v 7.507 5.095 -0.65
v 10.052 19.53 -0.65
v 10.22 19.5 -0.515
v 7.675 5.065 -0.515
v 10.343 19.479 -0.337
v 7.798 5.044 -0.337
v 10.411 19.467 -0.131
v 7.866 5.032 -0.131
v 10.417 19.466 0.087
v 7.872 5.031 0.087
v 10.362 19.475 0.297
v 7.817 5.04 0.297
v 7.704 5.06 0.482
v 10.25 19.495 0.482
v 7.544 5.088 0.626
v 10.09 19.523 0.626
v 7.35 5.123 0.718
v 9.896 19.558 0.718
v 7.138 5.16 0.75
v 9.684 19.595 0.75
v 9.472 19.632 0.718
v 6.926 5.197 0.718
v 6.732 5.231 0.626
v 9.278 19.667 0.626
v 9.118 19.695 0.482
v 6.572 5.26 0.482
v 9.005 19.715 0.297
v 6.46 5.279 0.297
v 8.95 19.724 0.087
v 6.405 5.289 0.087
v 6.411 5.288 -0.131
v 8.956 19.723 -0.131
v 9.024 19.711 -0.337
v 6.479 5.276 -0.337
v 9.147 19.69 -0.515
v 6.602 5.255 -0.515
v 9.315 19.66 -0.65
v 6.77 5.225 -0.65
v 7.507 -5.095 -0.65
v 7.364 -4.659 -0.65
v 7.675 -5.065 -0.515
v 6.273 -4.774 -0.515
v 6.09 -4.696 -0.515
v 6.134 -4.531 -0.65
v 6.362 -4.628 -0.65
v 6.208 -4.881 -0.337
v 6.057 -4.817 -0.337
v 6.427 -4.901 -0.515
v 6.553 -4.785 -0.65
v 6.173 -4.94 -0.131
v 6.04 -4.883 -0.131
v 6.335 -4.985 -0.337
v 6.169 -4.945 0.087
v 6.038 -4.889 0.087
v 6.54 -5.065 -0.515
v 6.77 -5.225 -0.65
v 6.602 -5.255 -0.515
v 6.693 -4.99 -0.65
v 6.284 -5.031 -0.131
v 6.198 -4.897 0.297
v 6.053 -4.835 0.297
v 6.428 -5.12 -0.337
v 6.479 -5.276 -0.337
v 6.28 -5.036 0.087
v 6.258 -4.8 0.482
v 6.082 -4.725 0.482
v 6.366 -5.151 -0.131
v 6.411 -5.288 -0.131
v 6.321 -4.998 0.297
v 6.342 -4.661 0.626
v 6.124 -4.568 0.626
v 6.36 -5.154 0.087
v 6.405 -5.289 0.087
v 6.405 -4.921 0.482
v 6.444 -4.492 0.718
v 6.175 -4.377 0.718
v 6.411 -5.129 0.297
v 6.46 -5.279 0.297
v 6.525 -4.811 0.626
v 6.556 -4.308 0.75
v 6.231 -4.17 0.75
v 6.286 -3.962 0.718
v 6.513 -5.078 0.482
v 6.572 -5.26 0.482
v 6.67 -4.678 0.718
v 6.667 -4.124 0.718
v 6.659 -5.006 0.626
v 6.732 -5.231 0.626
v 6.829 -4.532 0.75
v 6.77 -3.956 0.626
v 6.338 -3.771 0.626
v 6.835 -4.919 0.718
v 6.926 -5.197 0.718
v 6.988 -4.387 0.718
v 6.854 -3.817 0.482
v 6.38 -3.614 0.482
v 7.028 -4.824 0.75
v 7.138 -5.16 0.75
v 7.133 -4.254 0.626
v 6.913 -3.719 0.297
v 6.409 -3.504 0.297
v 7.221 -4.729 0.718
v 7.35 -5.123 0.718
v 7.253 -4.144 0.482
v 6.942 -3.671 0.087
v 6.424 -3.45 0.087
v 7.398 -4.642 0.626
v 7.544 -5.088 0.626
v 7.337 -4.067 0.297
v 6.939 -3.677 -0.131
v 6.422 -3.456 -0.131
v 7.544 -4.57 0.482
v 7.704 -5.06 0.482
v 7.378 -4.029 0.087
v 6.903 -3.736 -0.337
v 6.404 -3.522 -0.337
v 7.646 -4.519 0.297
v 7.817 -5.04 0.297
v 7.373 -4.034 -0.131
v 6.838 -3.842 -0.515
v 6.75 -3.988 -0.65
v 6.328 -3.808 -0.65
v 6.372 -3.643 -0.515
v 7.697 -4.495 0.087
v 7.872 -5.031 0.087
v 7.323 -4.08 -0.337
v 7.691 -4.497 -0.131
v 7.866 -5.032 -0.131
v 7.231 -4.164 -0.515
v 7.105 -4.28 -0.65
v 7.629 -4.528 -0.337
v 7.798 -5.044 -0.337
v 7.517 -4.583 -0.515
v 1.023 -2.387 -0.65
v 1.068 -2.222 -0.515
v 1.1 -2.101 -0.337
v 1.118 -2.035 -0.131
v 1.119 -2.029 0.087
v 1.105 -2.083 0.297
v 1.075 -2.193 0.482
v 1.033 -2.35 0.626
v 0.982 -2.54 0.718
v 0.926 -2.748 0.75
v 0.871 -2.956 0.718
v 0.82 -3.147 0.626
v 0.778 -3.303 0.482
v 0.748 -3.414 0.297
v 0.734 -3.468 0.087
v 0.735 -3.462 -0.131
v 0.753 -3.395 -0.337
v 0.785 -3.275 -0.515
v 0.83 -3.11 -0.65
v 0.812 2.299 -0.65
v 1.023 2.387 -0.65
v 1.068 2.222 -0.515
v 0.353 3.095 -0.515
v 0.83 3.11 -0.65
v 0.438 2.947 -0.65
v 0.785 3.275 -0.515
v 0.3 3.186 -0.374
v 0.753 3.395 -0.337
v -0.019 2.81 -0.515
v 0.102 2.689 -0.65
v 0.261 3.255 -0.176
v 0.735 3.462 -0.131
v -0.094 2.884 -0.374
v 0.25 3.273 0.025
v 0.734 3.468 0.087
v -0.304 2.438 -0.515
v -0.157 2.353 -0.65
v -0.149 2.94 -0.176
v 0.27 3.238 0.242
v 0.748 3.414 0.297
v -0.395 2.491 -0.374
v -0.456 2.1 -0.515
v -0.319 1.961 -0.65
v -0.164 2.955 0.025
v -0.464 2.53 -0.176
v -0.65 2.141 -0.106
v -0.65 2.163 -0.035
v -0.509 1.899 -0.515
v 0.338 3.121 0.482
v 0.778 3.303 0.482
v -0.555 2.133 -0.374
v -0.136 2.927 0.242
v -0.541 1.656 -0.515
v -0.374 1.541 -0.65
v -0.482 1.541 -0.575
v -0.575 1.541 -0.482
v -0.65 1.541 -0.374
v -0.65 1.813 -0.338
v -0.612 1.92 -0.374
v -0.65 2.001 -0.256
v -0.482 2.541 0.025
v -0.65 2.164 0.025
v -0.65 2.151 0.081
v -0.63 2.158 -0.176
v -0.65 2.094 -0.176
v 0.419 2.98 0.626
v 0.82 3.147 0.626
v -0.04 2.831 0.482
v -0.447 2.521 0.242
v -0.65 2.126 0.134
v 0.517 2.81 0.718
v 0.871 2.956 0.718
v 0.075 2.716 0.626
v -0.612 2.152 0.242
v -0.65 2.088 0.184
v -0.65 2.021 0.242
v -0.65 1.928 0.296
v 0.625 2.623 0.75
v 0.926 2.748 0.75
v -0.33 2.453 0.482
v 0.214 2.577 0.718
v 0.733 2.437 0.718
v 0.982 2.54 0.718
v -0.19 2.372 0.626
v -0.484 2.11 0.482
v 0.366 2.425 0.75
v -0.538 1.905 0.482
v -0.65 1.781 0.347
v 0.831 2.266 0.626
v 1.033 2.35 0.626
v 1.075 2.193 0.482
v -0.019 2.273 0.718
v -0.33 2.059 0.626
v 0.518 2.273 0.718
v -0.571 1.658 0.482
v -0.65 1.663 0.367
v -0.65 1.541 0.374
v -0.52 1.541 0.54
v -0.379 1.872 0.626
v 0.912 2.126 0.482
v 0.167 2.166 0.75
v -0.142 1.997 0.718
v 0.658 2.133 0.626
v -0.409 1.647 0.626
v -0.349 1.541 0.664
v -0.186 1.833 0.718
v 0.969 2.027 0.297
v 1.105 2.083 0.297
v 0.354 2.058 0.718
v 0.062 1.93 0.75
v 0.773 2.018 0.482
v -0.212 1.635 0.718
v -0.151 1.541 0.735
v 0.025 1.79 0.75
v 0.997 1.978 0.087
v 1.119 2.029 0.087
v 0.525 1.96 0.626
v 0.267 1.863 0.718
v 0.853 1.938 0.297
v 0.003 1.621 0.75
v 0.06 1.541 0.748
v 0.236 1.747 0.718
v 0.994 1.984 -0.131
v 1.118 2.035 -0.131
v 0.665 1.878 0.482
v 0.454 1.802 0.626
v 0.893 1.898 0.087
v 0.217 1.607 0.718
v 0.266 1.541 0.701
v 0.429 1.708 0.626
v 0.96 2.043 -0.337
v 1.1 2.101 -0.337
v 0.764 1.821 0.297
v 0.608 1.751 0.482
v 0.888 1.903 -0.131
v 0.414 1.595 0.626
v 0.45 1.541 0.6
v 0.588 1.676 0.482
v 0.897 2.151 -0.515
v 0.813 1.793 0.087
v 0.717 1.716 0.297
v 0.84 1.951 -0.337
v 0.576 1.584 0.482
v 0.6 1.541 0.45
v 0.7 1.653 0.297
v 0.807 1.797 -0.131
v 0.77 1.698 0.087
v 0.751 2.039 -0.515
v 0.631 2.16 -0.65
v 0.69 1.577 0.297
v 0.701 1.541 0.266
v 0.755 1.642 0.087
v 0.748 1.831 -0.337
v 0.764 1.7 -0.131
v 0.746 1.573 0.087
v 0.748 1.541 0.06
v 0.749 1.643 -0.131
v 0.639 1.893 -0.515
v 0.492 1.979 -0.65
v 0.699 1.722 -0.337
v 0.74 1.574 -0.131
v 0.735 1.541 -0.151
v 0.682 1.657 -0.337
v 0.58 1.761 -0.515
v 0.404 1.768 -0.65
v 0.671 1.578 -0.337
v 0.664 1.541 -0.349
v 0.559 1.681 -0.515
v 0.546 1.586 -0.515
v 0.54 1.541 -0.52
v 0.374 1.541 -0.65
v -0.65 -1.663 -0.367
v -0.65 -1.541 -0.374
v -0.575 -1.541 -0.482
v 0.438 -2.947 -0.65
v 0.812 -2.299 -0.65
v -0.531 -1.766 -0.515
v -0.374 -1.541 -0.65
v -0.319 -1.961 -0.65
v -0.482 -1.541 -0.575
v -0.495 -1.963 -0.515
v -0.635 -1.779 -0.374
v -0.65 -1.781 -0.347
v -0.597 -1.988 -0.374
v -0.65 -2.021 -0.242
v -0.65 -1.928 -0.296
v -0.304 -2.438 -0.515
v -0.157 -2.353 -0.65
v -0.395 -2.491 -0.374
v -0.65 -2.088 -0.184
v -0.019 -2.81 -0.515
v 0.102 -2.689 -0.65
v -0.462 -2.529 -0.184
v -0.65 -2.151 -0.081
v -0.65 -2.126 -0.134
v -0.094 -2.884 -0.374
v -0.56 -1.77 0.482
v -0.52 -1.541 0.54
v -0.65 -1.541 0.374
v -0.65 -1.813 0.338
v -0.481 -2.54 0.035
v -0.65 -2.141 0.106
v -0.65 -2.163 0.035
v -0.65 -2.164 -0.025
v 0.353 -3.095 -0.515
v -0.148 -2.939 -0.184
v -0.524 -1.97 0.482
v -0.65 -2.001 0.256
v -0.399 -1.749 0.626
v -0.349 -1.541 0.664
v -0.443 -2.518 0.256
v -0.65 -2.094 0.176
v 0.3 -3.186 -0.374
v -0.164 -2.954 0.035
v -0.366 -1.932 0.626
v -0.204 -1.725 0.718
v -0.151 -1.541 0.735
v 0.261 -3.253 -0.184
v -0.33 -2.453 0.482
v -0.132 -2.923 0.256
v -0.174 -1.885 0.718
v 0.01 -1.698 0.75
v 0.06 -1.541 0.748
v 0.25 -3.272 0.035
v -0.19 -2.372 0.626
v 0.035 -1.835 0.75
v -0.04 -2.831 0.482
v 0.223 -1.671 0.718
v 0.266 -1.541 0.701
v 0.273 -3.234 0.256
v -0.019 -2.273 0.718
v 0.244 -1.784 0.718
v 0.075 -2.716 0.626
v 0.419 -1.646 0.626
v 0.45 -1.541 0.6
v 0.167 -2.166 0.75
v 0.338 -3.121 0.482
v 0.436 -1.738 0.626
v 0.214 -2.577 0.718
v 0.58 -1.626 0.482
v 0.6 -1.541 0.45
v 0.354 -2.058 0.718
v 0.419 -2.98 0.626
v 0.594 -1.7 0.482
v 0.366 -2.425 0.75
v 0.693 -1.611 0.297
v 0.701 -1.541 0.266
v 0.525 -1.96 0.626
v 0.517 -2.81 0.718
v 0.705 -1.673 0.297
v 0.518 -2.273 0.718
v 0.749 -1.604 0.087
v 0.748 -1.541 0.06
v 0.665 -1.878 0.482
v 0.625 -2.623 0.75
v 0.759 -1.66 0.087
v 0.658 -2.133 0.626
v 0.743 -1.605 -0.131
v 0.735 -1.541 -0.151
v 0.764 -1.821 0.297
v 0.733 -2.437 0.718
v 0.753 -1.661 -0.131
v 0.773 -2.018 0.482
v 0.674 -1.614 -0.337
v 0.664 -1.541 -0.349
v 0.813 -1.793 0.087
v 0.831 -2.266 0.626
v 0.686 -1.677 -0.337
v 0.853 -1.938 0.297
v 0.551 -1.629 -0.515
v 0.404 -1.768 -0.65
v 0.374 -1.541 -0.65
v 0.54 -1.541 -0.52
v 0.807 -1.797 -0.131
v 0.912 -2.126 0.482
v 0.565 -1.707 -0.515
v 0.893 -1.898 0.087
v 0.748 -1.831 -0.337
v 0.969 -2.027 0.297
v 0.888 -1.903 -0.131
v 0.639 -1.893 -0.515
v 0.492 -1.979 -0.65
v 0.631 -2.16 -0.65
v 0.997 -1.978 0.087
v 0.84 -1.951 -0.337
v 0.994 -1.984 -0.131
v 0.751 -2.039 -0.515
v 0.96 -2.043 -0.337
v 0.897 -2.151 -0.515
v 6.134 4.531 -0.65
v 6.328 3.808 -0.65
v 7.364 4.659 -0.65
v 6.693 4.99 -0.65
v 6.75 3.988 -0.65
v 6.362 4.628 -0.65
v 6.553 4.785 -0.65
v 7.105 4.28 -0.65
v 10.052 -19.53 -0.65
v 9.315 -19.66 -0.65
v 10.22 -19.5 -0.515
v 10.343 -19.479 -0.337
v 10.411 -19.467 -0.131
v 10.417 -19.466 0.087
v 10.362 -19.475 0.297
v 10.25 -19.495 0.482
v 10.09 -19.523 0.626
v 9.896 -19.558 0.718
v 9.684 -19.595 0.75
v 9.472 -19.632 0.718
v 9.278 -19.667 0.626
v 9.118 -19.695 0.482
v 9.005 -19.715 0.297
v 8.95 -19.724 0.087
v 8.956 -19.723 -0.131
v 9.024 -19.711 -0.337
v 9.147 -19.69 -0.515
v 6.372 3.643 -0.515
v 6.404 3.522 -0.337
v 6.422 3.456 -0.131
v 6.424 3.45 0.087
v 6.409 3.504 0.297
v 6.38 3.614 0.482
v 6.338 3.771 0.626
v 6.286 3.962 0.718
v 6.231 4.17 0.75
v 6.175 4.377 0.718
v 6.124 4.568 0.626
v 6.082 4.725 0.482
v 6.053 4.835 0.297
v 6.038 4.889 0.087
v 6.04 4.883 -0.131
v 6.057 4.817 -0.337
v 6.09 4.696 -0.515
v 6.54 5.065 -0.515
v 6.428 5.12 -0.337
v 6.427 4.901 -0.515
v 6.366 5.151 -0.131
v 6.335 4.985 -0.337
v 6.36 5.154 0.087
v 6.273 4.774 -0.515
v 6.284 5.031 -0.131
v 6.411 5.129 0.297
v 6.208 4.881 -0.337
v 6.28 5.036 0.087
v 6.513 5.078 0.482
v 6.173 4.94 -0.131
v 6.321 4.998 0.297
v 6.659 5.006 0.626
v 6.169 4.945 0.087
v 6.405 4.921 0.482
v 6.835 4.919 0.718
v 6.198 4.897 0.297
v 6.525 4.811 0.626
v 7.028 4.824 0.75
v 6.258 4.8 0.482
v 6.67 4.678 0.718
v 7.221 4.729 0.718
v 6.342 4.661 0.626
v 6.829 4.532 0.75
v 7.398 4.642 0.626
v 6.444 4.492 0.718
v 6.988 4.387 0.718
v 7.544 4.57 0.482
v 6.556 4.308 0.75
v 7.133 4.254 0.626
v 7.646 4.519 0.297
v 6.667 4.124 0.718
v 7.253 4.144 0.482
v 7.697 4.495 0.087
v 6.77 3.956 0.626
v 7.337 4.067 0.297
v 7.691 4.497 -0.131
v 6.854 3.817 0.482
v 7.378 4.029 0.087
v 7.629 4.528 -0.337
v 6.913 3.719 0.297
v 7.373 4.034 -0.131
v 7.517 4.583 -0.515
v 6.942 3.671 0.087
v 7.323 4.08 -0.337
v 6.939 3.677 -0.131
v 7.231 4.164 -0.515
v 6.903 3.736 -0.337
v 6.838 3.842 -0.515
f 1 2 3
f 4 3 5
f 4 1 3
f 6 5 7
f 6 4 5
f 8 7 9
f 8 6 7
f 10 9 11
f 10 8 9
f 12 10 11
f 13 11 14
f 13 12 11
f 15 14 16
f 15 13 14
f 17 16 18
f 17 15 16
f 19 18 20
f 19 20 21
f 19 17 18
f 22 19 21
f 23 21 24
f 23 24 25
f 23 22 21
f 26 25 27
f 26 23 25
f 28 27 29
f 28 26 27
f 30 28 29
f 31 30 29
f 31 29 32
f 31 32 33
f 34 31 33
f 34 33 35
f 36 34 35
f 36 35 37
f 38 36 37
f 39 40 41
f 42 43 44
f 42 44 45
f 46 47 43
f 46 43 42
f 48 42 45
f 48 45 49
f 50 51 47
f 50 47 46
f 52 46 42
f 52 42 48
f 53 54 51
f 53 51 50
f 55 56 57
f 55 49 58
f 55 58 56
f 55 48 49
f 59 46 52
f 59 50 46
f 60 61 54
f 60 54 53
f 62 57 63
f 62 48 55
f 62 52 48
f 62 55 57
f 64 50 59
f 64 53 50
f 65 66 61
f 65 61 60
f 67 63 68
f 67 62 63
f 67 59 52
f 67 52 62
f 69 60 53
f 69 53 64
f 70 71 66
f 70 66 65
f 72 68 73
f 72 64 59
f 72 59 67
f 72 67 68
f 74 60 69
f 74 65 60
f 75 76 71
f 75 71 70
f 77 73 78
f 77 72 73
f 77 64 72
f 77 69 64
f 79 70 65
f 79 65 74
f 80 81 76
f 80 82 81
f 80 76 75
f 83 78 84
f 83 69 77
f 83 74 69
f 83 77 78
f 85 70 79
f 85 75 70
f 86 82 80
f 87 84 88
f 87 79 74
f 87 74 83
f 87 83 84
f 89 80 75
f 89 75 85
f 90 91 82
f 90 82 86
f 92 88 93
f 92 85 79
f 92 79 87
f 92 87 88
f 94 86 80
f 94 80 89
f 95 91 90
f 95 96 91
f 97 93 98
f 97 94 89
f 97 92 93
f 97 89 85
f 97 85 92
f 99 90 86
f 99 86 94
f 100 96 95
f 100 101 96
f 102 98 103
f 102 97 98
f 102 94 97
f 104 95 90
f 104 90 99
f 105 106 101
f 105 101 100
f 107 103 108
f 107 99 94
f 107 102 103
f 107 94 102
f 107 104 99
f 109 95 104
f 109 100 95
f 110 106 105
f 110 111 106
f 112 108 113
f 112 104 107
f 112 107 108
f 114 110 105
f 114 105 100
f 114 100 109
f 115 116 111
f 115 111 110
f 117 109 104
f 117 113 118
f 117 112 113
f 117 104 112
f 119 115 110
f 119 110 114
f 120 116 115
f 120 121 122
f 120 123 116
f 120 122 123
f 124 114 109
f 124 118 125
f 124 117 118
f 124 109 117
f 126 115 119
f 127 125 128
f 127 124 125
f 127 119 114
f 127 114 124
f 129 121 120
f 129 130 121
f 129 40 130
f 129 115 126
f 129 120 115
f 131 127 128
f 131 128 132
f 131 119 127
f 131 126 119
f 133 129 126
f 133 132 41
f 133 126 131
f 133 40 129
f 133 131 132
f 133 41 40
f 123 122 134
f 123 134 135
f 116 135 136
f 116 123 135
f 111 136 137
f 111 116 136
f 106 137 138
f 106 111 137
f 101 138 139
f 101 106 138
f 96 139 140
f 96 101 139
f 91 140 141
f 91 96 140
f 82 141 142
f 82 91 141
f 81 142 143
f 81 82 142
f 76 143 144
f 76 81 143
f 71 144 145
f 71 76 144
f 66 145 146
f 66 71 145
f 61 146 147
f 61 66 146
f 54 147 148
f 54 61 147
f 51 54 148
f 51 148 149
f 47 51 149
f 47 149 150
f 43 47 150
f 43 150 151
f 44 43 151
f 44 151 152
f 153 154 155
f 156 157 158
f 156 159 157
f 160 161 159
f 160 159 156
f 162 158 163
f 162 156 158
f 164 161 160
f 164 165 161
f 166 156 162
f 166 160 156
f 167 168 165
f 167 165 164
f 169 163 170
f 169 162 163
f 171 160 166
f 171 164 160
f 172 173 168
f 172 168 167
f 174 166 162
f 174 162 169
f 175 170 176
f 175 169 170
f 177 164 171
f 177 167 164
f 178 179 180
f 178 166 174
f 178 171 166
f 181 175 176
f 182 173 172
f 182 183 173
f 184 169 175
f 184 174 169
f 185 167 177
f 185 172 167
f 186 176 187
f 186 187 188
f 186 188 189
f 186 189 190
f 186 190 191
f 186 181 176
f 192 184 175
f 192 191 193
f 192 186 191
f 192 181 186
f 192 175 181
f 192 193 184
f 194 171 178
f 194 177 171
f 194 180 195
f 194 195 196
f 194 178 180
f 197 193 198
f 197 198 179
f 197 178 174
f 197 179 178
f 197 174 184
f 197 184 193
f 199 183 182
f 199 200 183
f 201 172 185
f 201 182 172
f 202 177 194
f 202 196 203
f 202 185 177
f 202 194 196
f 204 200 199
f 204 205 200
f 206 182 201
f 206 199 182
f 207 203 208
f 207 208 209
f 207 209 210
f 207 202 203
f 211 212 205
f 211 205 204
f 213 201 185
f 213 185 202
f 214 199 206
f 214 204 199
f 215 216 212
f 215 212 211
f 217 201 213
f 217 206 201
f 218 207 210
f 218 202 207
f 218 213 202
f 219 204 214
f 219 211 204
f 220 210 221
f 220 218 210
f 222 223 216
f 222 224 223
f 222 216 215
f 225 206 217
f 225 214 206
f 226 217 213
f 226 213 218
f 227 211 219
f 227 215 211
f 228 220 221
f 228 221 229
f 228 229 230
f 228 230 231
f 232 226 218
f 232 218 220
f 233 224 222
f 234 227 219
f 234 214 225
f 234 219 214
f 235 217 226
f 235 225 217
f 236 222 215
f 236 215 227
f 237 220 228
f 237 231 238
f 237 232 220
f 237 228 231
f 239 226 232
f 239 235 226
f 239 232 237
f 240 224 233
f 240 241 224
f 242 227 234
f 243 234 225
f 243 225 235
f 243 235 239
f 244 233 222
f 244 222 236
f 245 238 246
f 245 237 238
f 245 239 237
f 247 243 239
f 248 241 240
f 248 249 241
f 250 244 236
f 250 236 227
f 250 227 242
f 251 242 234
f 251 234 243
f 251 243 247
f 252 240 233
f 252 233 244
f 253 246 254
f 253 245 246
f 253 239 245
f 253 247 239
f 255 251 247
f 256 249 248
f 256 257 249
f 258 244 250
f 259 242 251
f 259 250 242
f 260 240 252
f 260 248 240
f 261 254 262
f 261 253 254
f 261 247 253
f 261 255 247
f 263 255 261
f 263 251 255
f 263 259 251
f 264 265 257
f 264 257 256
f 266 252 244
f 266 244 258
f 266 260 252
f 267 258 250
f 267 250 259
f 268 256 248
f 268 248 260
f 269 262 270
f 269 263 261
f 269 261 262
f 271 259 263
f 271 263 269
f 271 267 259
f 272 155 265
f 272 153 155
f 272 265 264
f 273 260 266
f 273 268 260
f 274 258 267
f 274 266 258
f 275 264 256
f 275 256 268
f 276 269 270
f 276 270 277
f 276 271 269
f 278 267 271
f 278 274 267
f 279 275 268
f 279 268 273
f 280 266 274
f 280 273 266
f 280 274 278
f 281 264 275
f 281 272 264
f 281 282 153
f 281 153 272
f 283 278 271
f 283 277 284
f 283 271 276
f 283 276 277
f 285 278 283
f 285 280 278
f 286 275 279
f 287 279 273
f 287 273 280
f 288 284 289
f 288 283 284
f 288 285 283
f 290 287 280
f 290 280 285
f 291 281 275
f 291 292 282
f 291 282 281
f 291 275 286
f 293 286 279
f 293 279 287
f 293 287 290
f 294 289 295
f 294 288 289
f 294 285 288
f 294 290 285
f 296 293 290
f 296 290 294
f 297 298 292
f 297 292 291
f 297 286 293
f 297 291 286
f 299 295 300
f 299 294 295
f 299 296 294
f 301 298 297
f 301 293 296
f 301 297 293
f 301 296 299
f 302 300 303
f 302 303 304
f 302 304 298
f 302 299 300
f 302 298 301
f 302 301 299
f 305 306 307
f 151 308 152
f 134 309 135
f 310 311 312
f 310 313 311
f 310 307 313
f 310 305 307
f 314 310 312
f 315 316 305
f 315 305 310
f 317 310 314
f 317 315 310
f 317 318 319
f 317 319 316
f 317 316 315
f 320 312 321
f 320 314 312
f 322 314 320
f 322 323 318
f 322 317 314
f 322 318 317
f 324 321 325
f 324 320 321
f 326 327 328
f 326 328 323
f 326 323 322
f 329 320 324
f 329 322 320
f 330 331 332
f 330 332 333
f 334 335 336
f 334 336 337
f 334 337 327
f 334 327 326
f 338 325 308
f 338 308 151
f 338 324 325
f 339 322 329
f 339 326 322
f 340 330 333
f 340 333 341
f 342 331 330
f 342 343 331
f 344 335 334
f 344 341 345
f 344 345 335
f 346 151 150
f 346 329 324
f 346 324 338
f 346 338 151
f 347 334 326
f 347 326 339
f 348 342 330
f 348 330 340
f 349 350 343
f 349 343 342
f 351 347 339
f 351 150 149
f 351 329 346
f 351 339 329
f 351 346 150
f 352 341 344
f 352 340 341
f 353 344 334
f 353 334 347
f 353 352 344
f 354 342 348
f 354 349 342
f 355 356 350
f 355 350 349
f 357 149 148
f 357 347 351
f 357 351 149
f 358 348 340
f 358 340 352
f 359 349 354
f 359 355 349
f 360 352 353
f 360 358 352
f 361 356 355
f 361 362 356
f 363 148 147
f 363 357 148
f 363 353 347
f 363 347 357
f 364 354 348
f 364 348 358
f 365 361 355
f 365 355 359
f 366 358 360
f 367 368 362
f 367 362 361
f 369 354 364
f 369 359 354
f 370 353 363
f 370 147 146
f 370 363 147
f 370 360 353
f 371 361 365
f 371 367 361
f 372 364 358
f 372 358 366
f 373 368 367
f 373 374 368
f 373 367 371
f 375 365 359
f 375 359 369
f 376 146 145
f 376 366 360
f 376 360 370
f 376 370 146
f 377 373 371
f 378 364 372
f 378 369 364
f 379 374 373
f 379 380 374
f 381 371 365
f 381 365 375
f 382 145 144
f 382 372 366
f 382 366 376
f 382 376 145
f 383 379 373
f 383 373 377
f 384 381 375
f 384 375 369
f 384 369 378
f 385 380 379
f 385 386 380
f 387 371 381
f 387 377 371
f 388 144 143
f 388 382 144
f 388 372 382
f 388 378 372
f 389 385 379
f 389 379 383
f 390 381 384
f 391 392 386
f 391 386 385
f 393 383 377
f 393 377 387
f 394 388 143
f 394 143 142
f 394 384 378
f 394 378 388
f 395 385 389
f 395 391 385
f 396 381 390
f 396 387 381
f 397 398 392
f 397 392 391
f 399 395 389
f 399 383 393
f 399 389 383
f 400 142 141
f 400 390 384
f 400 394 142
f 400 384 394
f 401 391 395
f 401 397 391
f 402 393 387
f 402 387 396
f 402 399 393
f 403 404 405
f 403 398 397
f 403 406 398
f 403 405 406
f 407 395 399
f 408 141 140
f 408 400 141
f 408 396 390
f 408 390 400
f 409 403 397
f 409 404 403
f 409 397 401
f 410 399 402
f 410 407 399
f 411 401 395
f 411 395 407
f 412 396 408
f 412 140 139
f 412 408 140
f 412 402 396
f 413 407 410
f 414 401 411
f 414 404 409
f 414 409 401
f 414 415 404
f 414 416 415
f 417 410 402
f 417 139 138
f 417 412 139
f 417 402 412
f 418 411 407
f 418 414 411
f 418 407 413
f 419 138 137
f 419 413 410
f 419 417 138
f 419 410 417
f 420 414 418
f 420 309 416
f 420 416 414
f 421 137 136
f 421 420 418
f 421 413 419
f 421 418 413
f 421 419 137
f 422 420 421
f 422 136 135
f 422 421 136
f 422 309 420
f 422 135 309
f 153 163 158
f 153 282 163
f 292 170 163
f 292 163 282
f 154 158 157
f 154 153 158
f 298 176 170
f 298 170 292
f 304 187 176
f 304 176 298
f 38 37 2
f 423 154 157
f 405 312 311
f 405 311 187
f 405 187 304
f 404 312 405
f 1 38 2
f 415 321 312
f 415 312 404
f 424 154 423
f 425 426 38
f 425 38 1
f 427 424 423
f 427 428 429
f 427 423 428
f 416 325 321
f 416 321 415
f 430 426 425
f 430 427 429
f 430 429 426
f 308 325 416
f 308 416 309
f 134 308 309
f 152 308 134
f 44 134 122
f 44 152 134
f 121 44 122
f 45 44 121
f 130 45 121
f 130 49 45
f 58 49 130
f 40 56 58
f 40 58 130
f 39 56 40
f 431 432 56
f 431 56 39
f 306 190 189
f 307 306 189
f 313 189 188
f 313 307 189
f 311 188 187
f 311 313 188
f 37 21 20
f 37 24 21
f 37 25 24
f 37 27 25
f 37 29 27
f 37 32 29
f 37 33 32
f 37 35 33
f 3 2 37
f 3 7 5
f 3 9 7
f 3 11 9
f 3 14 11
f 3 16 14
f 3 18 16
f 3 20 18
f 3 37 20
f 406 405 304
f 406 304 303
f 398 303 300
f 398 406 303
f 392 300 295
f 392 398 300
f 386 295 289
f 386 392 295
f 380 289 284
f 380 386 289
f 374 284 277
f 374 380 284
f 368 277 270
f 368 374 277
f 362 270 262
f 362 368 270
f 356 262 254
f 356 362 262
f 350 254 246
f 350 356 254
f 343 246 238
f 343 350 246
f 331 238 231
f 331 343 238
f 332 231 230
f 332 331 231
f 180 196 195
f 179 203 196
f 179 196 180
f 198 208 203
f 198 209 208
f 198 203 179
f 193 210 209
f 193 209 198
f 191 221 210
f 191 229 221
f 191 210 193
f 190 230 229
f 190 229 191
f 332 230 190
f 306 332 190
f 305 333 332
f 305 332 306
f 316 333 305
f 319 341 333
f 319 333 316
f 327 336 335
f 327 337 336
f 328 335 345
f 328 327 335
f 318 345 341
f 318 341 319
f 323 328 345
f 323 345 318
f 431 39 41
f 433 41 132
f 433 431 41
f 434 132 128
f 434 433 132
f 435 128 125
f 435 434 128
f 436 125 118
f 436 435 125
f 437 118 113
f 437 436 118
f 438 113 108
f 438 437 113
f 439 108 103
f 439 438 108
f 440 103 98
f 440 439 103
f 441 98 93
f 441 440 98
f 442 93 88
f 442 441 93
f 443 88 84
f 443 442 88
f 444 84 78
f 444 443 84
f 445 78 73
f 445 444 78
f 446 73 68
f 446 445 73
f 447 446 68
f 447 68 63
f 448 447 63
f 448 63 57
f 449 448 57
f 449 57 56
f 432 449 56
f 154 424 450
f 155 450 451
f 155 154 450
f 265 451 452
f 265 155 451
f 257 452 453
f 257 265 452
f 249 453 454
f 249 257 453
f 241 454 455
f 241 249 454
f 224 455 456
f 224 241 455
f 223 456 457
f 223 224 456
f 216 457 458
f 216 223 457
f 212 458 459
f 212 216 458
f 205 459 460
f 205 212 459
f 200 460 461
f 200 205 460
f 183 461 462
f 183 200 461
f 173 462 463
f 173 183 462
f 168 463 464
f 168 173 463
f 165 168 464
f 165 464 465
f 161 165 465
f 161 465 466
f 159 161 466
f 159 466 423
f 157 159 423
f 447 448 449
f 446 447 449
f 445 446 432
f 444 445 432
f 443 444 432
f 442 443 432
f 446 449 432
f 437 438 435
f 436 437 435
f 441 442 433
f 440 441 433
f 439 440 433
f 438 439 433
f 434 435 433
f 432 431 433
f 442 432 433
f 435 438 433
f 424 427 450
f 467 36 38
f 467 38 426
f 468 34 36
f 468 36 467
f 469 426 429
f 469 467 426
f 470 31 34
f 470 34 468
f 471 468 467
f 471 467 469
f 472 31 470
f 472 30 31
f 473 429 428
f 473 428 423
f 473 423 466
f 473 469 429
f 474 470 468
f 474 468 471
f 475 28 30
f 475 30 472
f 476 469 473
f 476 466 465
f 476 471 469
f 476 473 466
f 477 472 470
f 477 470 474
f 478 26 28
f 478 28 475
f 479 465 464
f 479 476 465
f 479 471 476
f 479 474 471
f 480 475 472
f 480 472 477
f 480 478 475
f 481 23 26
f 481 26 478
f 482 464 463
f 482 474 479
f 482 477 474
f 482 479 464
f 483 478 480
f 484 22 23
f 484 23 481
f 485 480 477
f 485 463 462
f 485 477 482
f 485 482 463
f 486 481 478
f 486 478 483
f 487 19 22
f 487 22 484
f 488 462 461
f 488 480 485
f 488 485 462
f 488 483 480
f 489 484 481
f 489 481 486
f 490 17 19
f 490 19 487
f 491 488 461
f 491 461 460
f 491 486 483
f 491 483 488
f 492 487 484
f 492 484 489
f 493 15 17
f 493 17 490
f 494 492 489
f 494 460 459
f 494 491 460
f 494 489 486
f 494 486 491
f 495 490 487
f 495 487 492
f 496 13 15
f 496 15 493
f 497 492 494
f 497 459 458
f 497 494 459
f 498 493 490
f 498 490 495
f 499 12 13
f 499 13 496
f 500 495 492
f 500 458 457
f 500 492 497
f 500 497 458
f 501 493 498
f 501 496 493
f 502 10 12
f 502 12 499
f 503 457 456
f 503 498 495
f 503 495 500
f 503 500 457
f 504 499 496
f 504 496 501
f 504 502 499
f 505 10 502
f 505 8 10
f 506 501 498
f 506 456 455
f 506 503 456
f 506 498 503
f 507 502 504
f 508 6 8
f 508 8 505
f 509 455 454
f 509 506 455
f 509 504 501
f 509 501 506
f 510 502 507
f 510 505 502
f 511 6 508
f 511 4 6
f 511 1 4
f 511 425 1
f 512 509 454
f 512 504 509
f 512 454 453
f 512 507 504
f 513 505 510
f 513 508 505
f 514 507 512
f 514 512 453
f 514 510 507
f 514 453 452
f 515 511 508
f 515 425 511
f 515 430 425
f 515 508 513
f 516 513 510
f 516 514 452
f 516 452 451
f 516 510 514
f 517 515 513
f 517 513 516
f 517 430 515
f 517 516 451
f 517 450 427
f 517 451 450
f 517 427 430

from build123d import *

# Parameters (mm, degrees)
SKETCH_2_R               = 0.75
CUT_EXTRUDE_1_DEPTH      = 23.321950206
CUT_EXTRUDE_1_DEPTH_BACK = 23.321950206
SKETCH_3_W               = 12
SKETCH_3_H               = 0.1
CUT_EXTRUDE_2_DEPTH      = 23.321950206
CUT_EXTRUDE_2_DEPTH_BACK = 23.321950206
SKETCH_4_W               = 0.1
SKETCH_4_H               = 1.5


with BuildPart() as part:
    # По траектории1: sweep along a path in Эскиз1
    with BuildLine(Plane.XY) as sweep_1_path:
        Line((9.683583031, 19.595), (7.138282612, 5.159884012))
        ThreePointArc((7.138282612, 5.159884012), (6.828869592, 4.532456475), (6.230796727, 4.169536951))
        Line((6.230796727, 4.169536951), (0.926476194, 2.748248548))
        ThreePointArc((0.926476194, 2.748248548), (0.258308325, 2.301793051), (0, 1.540841265))
        Line((0, 1.540841265), (0, -1.540841265))
        ThreePointArc((0, -1.540841265), (0.258308325, -2.301793051), (0.926476194, -2.748248548))
        Line((0.926476194, -2.748248548), (6.230796727, -4.169536951))
        ThreePointArc((6.230796727, -4.169536951), (6.828869592, -4.532456475), (7.138282612, -5.159884012))
        Line((7.138282612, -5.159884012), (9.683583031, -19.595))
    # Эскиз2 → По траектории1 (sweep)
    with BuildSketch(Plane(origin=(0, 0, 0), x_dir=(1, 0, 0), z_dir=(0, 1, 0))):
        Circle(SKETCH_2_R)
    sweep(path=sweep_1_path.line)

    # Эскиз3 → Вырез-Вытянуть1 (cut, two sides: drawn at the far end of the back side and taken through both)
    with BuildSketch(Plane(origin=(0, 0, 0), x_dir=(1, 0, 0), z_dir=(0, 1, 0)).offset(-CUT_EXTRUDE_1_DEPTH_BACK)):
        with Locations((5, 0.7)):
            Rectangle(SKETCH_3_W, SKETCH_3_H)
    extrude(amount=CUT_EXTRUDE_1_DEPTH + CUT_EXTRUDE_1_DEPTH_BACK, mode=Mode.SUBTRACT)

    # Эскиз4 → Вырез-Вытянуть2 (cut, two sides: drawn at the far end of the back side and taken through both)
    with BuildSketch(Plane(origin=(0, 0, 0), x_dir=(1, 0, 0), z_dir=(0, 1, 0)).offset(-CUT_EXTRUDE_2_DEPTH_BACK)):
        with Locations((-0.7, 0)):
            Rectangle(SKETCH_4_W, SKETCH_4_H)
    extrude(amount=CUT_EXTRUDE_2_DEPTH + CUT_EXTRUDE_2_DEPTH_BACK, mode=Mode.SUBTRACT)


solid = part.part
